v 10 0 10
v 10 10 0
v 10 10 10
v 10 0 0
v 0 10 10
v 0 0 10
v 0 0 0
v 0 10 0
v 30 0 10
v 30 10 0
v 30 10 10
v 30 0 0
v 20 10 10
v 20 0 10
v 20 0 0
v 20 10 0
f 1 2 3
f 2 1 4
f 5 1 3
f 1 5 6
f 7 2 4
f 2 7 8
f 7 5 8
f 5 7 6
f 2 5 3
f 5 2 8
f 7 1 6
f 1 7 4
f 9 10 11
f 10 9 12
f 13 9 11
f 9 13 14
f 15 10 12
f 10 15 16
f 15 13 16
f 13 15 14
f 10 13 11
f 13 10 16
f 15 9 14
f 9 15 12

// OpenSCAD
// Seeded fault for tools/scad2step.py (TV-015): two top-level objects (no enclosing union), so the
// CSG import has two roots (check C2).
cube([10, 10, 10]);
translate([20, 0, 0]) cube([10, 10, 10]);
